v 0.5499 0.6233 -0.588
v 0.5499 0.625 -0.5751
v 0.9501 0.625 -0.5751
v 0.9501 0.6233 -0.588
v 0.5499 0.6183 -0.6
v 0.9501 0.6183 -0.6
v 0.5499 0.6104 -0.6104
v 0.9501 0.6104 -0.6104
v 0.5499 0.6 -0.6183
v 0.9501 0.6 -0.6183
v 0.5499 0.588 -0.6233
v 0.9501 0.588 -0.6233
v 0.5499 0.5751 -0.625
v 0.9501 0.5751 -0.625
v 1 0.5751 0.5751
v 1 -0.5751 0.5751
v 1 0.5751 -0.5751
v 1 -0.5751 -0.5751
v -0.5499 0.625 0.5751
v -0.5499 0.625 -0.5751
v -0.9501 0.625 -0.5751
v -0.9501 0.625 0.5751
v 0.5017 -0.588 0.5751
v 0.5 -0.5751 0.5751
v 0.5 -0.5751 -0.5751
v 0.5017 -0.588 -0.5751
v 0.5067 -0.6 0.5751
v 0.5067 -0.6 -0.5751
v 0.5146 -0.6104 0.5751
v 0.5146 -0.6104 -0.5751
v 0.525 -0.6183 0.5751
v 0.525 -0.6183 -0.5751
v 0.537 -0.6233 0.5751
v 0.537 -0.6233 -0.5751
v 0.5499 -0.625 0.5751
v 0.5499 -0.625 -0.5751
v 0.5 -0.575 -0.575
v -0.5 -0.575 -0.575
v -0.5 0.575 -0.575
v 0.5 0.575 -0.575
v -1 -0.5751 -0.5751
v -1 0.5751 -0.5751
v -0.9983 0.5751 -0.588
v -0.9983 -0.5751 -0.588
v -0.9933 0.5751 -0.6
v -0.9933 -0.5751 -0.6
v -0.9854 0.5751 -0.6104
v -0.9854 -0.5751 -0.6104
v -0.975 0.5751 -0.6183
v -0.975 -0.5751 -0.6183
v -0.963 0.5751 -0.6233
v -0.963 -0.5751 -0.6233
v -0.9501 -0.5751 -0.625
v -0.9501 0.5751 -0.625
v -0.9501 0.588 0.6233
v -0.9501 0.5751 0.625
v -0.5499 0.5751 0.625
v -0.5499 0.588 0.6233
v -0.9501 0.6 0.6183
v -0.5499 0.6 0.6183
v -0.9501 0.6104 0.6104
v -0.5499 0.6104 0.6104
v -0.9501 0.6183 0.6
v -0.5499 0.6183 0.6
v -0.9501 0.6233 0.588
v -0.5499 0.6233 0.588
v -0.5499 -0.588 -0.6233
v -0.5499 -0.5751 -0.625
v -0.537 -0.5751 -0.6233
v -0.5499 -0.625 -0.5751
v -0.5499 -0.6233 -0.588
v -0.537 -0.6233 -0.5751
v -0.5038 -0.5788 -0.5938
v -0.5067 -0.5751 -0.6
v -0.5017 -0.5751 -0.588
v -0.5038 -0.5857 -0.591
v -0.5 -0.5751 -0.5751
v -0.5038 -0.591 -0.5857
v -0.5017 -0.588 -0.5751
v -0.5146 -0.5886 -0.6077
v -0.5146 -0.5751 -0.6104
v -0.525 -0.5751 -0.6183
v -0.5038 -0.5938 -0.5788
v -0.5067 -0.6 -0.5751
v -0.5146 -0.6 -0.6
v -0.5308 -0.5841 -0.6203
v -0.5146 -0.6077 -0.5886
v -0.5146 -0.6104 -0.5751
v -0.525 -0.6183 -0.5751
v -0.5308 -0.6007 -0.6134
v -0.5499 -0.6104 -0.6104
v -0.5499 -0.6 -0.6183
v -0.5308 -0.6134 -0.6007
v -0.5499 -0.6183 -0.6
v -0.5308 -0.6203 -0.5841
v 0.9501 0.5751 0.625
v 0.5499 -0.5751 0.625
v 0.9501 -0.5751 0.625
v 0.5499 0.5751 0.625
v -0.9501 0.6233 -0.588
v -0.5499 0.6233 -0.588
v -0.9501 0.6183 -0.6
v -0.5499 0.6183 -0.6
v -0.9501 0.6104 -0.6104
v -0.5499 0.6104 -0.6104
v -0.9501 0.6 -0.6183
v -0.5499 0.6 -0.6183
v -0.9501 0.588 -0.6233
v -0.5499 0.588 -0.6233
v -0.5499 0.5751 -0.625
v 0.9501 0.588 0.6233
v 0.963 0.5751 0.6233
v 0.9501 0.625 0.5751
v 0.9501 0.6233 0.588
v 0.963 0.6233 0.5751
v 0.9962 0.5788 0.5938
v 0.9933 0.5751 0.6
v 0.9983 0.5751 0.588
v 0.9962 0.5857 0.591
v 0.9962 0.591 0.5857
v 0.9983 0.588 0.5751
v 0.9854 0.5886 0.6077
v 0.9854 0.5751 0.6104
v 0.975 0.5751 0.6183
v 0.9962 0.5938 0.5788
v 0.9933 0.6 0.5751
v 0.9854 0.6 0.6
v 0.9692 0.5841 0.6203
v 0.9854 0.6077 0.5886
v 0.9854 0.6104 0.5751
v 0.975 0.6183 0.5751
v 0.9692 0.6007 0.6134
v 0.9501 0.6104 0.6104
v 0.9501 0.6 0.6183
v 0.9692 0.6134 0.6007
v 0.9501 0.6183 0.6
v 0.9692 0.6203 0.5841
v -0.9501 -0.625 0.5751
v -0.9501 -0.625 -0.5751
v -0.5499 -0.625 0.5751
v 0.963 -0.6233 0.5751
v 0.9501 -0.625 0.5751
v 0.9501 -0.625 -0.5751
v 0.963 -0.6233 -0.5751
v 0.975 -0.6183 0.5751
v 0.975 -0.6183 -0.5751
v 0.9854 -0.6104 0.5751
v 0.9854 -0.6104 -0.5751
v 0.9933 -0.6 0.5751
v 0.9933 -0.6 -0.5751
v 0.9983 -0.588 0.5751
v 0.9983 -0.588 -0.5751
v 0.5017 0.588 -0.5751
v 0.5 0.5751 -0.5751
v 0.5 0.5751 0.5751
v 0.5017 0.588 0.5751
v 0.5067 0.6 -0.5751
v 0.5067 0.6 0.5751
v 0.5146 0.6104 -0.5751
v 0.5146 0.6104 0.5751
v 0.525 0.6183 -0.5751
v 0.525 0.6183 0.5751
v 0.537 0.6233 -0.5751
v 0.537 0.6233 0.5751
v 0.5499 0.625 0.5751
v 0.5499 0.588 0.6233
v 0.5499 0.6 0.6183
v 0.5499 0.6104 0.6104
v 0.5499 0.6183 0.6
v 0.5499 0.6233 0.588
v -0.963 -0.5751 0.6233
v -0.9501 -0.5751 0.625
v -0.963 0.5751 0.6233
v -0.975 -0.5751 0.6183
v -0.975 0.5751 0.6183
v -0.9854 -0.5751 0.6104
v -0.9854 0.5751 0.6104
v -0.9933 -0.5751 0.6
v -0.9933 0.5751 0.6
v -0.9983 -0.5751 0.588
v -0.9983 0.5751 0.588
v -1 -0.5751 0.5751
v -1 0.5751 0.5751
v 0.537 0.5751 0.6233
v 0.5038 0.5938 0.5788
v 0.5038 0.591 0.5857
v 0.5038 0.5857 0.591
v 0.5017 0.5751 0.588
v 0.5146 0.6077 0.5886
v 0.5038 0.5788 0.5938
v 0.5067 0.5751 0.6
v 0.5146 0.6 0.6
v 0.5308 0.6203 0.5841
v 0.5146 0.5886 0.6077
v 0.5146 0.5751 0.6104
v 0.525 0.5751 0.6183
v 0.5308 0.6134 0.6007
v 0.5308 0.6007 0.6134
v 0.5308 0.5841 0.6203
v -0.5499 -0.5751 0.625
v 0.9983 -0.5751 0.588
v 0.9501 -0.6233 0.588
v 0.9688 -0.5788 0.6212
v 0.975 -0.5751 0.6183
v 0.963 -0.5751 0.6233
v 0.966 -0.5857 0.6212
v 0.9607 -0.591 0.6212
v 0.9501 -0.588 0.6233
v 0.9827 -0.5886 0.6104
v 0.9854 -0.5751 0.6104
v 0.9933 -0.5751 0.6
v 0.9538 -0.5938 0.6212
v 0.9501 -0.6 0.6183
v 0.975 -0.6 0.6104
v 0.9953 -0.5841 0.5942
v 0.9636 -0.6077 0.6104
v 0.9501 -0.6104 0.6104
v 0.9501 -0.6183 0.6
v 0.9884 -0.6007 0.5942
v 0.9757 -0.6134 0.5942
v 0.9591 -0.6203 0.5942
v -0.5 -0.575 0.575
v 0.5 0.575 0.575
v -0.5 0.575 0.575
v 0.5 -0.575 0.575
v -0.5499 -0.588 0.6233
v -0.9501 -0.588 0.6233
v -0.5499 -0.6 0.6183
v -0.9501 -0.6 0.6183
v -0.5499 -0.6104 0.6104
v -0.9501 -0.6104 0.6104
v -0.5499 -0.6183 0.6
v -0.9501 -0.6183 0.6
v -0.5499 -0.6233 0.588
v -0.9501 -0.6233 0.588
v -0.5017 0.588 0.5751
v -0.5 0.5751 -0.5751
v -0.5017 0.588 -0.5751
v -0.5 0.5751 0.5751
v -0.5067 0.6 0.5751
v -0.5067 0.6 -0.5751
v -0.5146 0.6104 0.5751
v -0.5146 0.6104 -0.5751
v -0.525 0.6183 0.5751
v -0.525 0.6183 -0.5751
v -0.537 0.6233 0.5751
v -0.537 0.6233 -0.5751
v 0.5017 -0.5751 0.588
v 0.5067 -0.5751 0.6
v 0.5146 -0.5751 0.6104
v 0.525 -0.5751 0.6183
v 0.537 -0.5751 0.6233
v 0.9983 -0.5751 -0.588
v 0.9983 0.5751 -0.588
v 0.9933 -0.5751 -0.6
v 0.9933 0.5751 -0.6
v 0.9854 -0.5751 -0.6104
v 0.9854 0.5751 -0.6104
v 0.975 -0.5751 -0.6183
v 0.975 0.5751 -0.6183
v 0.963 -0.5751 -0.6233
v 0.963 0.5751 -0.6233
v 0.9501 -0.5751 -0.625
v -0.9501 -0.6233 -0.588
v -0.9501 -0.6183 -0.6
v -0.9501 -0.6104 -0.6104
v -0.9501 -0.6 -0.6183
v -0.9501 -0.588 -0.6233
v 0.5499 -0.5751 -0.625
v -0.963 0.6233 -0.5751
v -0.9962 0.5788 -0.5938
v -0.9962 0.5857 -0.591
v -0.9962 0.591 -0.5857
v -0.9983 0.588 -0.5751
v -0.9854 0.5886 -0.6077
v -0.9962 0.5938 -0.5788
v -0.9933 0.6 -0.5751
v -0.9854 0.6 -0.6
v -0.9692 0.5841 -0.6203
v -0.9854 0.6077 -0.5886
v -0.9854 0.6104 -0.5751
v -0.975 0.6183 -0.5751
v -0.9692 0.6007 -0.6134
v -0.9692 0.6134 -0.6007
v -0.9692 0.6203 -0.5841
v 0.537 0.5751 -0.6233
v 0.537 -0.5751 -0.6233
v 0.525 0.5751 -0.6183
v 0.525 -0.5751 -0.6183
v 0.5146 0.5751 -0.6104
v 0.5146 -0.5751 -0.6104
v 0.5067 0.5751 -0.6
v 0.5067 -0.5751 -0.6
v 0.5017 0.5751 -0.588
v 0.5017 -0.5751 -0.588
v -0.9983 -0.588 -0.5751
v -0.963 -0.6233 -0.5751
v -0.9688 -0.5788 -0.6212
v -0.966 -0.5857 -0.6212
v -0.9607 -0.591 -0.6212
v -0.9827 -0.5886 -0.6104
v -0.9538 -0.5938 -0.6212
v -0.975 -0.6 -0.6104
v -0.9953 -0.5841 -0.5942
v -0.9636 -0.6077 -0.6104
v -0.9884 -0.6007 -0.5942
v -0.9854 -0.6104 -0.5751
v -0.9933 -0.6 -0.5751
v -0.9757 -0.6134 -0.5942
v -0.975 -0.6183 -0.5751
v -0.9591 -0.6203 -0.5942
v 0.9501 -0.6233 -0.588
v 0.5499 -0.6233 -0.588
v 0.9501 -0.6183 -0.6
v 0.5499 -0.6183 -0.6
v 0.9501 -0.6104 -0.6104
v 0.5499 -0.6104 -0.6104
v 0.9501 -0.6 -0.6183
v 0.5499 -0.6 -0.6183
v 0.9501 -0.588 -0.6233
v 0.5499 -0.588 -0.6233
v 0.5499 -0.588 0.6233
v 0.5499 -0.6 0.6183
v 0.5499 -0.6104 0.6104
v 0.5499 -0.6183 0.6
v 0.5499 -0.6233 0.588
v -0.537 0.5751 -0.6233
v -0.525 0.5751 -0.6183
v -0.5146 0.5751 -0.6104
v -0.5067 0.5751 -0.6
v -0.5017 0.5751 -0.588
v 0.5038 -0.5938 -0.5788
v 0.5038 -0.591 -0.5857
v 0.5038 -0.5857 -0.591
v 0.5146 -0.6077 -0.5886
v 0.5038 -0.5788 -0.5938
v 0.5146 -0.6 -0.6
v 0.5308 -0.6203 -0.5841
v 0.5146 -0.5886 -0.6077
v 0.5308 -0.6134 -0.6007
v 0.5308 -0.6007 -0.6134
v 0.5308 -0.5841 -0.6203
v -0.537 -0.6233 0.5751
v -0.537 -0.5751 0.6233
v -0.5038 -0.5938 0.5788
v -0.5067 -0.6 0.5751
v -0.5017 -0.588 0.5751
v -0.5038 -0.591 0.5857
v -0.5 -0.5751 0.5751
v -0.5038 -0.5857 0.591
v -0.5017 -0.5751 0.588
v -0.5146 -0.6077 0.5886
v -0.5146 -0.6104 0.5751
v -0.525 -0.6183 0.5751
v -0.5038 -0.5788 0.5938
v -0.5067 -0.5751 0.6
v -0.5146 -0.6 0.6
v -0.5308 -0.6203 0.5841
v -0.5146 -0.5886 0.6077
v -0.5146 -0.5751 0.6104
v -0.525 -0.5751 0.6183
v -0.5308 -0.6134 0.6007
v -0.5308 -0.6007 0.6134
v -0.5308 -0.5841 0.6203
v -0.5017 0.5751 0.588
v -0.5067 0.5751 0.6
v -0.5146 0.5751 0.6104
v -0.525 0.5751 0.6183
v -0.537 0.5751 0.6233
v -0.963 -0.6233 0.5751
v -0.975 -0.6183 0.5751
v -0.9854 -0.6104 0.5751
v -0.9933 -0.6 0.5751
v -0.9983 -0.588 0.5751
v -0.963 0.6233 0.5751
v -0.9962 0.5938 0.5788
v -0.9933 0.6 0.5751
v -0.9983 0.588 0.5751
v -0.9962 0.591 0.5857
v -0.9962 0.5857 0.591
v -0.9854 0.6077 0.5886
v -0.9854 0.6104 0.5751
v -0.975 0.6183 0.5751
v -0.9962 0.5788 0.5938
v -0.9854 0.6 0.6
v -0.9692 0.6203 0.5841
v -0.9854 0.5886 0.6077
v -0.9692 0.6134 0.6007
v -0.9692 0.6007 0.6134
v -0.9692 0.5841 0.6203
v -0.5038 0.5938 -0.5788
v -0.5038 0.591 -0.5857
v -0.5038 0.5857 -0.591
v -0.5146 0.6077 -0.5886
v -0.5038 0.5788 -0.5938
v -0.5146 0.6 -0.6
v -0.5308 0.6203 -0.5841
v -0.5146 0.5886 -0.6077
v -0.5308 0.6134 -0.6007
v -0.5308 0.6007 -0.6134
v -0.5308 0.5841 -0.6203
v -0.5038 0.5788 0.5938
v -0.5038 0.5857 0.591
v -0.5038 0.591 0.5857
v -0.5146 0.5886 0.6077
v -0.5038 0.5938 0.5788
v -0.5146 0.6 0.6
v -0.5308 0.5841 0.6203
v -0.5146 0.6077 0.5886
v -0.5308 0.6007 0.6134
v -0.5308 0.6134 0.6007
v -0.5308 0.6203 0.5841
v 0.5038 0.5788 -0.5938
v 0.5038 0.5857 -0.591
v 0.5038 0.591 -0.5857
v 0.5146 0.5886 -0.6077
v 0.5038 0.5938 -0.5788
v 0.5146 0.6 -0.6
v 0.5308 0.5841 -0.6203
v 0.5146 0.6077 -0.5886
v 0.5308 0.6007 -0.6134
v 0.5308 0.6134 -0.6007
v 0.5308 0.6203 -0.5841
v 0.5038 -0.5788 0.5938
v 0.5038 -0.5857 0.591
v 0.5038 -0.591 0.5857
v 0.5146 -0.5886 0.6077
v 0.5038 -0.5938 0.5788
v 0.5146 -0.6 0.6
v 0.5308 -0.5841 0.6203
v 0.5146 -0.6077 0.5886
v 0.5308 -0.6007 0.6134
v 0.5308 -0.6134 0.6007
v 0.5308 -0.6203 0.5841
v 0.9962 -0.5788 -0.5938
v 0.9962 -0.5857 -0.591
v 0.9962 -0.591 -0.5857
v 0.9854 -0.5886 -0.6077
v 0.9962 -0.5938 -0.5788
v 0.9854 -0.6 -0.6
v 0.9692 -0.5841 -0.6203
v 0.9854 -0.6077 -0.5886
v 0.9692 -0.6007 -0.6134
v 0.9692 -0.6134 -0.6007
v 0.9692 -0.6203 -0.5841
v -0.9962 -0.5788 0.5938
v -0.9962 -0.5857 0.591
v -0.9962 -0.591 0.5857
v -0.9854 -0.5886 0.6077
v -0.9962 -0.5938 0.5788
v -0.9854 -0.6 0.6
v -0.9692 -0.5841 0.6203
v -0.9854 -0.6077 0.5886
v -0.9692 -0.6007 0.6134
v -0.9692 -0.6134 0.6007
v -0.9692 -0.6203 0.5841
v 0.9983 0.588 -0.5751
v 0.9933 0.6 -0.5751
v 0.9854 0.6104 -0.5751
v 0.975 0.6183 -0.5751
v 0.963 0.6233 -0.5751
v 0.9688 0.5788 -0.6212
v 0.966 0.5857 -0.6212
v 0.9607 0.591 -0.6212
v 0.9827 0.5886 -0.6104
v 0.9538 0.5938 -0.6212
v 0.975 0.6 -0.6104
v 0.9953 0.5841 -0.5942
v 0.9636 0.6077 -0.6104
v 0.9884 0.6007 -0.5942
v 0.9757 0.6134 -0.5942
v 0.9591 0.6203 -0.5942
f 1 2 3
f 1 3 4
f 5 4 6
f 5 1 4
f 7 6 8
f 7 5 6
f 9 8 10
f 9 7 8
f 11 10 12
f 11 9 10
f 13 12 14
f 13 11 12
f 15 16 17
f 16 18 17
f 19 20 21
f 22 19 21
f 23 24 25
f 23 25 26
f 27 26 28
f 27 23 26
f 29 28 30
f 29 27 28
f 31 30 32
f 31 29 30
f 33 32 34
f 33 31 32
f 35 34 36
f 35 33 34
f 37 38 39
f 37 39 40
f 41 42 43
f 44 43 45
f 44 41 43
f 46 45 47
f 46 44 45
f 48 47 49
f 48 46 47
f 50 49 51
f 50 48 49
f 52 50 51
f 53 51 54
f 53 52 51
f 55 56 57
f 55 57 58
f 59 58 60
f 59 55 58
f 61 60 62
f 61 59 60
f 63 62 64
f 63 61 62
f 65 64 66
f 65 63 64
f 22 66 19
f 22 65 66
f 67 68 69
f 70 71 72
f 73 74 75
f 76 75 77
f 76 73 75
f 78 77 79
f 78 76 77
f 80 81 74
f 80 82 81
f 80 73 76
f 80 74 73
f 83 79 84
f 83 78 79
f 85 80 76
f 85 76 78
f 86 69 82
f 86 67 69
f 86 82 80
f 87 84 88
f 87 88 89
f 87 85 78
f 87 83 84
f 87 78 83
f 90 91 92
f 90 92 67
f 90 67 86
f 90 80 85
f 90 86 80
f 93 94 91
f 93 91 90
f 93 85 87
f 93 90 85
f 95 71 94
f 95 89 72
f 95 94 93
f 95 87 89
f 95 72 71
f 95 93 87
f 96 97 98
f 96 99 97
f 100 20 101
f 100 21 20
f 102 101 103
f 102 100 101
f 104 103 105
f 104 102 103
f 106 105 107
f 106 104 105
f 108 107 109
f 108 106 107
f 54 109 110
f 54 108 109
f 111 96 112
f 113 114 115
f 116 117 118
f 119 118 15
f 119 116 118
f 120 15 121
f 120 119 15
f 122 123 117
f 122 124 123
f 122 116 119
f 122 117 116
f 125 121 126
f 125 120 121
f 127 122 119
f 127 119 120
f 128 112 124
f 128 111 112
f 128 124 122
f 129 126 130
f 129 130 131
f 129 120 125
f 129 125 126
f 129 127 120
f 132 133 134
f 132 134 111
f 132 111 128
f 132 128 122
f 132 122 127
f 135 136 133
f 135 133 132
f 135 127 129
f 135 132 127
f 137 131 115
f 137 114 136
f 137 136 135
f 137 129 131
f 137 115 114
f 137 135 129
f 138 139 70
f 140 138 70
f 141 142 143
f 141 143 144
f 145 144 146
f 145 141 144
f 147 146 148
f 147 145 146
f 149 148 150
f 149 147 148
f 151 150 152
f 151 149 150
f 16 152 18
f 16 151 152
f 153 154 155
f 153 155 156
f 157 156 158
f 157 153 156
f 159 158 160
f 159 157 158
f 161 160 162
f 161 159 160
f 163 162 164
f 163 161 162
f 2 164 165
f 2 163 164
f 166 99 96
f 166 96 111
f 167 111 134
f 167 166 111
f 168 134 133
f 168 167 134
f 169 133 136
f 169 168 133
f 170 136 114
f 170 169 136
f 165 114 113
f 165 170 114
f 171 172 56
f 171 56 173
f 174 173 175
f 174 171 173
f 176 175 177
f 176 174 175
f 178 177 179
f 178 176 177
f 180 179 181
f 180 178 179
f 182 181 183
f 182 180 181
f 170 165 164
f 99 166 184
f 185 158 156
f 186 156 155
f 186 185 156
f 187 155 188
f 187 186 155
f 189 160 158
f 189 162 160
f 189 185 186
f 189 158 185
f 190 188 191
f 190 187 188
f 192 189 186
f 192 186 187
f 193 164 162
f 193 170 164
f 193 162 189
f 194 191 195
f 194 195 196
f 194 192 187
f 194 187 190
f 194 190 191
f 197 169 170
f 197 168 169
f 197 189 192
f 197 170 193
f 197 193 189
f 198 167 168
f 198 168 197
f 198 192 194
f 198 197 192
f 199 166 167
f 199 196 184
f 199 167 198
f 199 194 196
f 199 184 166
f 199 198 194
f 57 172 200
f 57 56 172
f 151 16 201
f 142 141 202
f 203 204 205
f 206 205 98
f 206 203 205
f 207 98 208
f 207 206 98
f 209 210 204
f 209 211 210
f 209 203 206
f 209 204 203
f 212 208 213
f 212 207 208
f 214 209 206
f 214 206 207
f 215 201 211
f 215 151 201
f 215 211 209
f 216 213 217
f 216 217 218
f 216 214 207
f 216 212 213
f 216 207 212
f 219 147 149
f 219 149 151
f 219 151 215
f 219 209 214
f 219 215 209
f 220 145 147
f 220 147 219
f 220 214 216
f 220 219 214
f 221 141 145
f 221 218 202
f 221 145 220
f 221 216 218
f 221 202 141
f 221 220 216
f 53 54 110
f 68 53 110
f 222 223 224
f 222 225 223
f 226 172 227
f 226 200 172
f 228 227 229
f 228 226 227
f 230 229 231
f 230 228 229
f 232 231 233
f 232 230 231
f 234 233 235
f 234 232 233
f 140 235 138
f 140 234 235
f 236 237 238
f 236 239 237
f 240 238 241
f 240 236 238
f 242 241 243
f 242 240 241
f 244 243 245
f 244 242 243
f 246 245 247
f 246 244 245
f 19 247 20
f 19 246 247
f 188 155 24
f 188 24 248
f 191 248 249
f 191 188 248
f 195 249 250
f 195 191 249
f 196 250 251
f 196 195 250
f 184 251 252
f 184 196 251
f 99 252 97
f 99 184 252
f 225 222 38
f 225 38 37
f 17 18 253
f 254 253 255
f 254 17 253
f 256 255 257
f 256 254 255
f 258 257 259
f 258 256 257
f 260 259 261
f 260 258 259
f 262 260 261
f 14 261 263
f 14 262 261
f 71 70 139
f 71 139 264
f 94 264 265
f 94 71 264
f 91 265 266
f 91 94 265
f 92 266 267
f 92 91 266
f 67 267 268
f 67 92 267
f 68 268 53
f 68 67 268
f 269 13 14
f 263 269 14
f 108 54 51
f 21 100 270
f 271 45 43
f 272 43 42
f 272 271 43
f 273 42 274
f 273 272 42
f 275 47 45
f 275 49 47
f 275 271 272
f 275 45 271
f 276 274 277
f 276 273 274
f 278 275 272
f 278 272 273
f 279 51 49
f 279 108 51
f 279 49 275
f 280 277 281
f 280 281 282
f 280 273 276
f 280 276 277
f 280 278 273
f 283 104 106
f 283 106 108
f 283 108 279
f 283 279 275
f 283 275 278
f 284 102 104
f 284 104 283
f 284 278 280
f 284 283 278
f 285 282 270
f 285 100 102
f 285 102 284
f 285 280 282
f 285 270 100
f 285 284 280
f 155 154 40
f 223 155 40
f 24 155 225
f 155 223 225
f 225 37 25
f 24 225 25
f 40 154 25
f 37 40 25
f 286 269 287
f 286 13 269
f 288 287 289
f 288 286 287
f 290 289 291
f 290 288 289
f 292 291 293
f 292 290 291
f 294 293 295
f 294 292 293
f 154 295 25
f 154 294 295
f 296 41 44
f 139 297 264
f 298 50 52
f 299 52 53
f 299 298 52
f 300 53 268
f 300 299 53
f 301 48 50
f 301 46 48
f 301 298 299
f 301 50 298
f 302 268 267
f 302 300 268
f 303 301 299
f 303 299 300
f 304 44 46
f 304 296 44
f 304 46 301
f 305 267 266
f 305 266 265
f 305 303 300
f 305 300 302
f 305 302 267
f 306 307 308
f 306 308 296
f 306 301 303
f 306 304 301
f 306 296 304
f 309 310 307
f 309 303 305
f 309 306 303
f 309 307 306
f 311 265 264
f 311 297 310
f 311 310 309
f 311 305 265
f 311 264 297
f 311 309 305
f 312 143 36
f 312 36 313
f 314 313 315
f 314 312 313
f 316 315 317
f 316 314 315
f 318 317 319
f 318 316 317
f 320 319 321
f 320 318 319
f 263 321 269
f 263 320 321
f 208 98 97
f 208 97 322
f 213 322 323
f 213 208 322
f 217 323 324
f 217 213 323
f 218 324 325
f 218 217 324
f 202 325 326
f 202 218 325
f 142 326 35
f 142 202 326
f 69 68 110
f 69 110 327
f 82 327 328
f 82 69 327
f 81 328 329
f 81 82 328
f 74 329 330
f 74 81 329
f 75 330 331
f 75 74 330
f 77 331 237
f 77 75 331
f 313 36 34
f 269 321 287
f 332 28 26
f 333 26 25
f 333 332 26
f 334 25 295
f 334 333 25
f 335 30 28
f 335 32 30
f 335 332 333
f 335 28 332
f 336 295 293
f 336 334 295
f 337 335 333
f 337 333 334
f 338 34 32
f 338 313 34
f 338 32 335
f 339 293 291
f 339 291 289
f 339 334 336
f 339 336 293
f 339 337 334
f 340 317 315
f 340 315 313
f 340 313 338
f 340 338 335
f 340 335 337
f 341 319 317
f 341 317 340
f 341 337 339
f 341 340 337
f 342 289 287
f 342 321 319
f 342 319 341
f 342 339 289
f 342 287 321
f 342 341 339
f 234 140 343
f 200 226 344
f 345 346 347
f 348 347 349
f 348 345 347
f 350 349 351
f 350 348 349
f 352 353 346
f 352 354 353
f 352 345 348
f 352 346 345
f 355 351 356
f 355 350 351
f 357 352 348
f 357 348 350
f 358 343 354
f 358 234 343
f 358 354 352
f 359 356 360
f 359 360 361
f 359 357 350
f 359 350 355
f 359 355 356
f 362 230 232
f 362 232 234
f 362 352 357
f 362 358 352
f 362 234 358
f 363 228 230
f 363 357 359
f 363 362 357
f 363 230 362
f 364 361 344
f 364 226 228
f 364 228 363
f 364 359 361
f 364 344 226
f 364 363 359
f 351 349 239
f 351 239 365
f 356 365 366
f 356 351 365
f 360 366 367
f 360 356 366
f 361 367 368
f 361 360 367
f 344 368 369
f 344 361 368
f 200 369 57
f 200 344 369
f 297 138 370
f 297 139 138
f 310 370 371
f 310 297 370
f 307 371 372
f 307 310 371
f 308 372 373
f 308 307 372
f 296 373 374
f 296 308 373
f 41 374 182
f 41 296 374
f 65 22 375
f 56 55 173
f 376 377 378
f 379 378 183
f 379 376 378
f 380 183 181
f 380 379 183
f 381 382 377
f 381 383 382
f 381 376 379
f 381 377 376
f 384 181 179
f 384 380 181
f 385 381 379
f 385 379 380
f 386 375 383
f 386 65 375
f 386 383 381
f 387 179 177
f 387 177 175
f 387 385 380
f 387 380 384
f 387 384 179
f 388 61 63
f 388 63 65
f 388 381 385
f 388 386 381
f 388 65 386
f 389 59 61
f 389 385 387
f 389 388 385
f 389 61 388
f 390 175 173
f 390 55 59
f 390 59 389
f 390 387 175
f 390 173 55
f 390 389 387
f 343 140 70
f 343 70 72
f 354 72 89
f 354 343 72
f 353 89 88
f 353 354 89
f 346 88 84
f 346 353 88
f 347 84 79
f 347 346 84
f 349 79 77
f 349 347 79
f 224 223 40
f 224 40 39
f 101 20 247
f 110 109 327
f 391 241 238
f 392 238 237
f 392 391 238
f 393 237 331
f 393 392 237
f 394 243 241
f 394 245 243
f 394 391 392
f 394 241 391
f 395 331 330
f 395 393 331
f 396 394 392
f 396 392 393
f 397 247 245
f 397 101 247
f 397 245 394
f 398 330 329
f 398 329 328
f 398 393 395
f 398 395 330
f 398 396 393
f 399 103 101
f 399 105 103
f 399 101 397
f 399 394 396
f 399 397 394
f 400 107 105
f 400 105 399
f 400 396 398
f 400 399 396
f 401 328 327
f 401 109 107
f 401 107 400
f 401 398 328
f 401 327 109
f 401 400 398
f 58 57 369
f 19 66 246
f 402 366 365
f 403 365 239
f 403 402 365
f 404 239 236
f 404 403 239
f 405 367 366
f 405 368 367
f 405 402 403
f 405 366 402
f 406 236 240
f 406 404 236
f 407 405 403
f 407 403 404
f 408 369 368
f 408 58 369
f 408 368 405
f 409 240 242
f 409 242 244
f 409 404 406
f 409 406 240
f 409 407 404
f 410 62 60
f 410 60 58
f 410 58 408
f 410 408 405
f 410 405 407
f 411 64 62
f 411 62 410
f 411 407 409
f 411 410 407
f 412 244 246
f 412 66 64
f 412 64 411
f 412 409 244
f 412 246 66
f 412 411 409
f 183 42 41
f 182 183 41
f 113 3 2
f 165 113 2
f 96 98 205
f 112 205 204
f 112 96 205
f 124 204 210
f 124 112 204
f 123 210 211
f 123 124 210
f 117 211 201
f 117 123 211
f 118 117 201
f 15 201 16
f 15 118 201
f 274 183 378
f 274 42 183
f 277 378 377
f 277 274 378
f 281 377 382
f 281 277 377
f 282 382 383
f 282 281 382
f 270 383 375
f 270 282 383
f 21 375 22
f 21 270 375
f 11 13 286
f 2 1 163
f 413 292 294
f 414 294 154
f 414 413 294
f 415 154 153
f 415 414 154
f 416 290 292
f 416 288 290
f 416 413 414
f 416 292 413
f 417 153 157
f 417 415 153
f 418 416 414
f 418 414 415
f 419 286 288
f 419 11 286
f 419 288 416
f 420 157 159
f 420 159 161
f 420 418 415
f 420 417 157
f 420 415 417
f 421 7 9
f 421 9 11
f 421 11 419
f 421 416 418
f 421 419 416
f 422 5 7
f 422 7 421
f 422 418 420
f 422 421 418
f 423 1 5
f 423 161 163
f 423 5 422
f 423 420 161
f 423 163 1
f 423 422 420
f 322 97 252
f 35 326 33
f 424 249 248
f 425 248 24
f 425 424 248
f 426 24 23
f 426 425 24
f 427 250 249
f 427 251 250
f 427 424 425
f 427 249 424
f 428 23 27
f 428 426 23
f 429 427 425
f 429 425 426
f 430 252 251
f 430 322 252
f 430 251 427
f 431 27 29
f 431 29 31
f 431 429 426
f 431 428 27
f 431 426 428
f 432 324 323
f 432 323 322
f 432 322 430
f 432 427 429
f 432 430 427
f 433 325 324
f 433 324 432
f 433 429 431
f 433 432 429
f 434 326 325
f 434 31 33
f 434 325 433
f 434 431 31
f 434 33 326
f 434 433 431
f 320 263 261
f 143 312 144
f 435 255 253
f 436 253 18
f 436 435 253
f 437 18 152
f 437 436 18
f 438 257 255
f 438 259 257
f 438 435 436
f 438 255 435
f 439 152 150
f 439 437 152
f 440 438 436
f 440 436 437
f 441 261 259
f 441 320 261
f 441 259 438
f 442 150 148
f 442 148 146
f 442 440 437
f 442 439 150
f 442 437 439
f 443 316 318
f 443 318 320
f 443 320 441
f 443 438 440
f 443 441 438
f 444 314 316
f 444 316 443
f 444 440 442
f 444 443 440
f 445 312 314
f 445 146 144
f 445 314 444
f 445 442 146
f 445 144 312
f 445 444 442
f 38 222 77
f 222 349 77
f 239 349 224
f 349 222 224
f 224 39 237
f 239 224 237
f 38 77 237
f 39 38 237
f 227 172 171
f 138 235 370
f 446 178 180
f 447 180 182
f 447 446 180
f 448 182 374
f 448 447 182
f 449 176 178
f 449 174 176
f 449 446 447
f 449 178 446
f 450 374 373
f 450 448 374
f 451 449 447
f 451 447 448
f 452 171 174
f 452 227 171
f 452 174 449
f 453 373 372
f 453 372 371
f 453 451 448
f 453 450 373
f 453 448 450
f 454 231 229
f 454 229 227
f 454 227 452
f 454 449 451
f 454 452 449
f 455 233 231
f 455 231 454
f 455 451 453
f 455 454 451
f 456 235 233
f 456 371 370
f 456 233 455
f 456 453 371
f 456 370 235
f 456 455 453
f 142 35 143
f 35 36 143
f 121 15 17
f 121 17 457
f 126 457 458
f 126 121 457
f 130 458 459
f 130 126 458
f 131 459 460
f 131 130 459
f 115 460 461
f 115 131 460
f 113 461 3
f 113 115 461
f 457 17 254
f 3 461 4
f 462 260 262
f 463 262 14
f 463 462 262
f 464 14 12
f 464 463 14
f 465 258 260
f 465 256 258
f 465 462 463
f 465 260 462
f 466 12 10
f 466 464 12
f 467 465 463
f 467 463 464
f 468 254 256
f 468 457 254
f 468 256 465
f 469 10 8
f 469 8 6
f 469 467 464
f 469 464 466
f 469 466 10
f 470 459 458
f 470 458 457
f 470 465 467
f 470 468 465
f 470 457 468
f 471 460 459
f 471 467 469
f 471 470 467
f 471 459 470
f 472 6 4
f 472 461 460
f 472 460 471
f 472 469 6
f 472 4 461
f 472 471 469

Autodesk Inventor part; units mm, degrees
ref_plane "YZ Plane" through (0, 0, 0) normal (1, 0, 0) x (0, 1, 0)
ref_plane "XZ Plane" through (0, 0, 0) normal (0, 1, 0) x (-1, 0, 0)
ref_plane "XY Plane" through (0, 0, 0) normal (0, 0, 1) x (1, 0, 0)
sketch "Sketch1" plane through (0, 0, 0) normal (0, 0, 1) x (1, 0, 0)
  line L0 (1, 0.625) -> (-1, 0.625)
  line L1 (-1, 0.625) -> (-1, -0.625)
  line L2 (-1, -0.625) -> (1, -0.625)
  line L3 (1, -0.625) -> (1, 0.625)
  line L4 (1, 0.625) -> (-1, -0.625) construction
  line L5 (-1, 0.625) -> (1, -0.625) construction
  point P0 (0, 0)
  point P1 (0, 0)
  point P2 (0, 0)
  dimension "d0" = 2
  dimension "d1" = 1.25
sketch "Sketch1 outline for Extrusion1" plane through (0, 0, 0) normal (0, 0, 1) x (1, 0, 0)
  line L0 (1, -0.625) -> (1, 0.625)
  line L1 (-1, -0.625) -> (1, -0.625)
  line L2 (-1, 0.625) -> (-1, -0.625)
  line L3 (1, 0.625) -> (-1, 0.625)
extrude "Extrusion1" add sketch "Sketch1 outline for Extrusion1" along normal mid plane 1.25
sketch "Sketch2" plane through (0, 0, 0.625) normal (0, 0, 1) x (-1, 0, 0)
  line L0 (0.5, 0.624281) -> (0.5, -0.625)
  line L1 (-0.5, 0.625) -> (-0.5, -0.625)
  line L2 (-0.5, 0.625) -> (0.5, 0.625)
  line L3 (0.5, 0.625) -> (0.5, -0.625)
  line L4 (0.5, -0.625) -> (-0.5, -0.625)
  line L5 (-0.5, -0.625) -> (-0.5, 0.625)
  line L6 (-1, -0.625) -> (1, -0.625)
  line L7 (1, 0.625) -> (-1, 0.625)
  line L8 (1, -0.625) -> (1, 0.625)
  line L9 (-1, 0.625) -> (-1, -0.625)
  point P0 (0, 0)
  dimension "d11" = 0.5
  dimension "d12" = 0.5
sketch "Sketch2 outline for Extrusion2" plane through (0, 0, 0.625) normal (0, 0, 1) x (-1, 0, 0)
  line L0 (-0.5, -0.625) -> (0.5, -0.625)
  line L1 (-0.5, 0.625) -> (-0.5, -0.625)
  line L2 (0.5, 0.625) -> (-0.5, 0.625)
  line L3 (0.5, -0.625) -> (0.5, 0.625)
extrude "Extrusion2" cut sketch "Sketch2 outline for Extrusion2" against normal blind 0.05
mirror "Mirror1" about plane through (0, 0, 0) normal (0, 0, 1) of "Extrusion2"
sketch "Sketch3" plane through (1, -0.625, -0.625) normal (0, -1, 0) x (1, 0, 0)
  line L0 (-1.5, 1.2) -> (-0.5, 1.2)
  line L1 (-0.5, 1.2) -> (-0.5, 0.05)
  line L2 (-0.5, 0.05) -> (-1.5, 0.05)
  line L3 (-1.5, 0.05) -> (-1.5, 1.2)
  point P0 (-1, 0.625)
sketch "Sketch3 outline for Extrusion3" plane through (1, -0.625, -0.625) normal (0, -1, 0) x (1, 0, 0)
  line L0 (-1.5, 1.2) -> (-0.5, 1.2)
  line L1 (-0.5, 1.2) -> (-0.5, 0.05)
  line L2 (-0.5, 0.05) -> (-1.5, 0.05)
  line L3 (-1.5, 0.05) -> (-1.5, 1.2)
extrude "Extrusion3" cut sketch "Sketch3 outline for Extrusion3" against normal blind 0.05
mirror "Mirror2" about plane through (0, 0, 0) normal (0, 1, 0) of "Extrusion3"
fillet "Fillet1" radius 0.05 24 edges at (0.75, 0.625, 0.625) (1, 0.625, 0) (0.75, 0.625, -0.625) (0.75, -0.625, -0.625) (1, -0.625, 0) (0.75, -0.625, 0.625) (-0.75, -0.625, 0.625) (-1, -0.625, 0) (-0.75, -0.625, -0.625) (1, 0, -0.625) (1, 0, 0.625) (-0.75, 0.625, 0.625) (-1, 0, 0.625) (-0.75, 0.625, -0.625) (-1, 0.625, 0) (-1, 0, -0.625) (-0.5, 0.625, 0) (-0.5, 0, 0.625) (-0.5, -0.625, 0) (-0.5, 0, -0.625) (0.5, 0.625, 0) (0.5, 0, -0.625) (0.5, -0.625, 0) (0.5, 0, 0.625)
properties part number "CL21F106ZPFNNNE"
